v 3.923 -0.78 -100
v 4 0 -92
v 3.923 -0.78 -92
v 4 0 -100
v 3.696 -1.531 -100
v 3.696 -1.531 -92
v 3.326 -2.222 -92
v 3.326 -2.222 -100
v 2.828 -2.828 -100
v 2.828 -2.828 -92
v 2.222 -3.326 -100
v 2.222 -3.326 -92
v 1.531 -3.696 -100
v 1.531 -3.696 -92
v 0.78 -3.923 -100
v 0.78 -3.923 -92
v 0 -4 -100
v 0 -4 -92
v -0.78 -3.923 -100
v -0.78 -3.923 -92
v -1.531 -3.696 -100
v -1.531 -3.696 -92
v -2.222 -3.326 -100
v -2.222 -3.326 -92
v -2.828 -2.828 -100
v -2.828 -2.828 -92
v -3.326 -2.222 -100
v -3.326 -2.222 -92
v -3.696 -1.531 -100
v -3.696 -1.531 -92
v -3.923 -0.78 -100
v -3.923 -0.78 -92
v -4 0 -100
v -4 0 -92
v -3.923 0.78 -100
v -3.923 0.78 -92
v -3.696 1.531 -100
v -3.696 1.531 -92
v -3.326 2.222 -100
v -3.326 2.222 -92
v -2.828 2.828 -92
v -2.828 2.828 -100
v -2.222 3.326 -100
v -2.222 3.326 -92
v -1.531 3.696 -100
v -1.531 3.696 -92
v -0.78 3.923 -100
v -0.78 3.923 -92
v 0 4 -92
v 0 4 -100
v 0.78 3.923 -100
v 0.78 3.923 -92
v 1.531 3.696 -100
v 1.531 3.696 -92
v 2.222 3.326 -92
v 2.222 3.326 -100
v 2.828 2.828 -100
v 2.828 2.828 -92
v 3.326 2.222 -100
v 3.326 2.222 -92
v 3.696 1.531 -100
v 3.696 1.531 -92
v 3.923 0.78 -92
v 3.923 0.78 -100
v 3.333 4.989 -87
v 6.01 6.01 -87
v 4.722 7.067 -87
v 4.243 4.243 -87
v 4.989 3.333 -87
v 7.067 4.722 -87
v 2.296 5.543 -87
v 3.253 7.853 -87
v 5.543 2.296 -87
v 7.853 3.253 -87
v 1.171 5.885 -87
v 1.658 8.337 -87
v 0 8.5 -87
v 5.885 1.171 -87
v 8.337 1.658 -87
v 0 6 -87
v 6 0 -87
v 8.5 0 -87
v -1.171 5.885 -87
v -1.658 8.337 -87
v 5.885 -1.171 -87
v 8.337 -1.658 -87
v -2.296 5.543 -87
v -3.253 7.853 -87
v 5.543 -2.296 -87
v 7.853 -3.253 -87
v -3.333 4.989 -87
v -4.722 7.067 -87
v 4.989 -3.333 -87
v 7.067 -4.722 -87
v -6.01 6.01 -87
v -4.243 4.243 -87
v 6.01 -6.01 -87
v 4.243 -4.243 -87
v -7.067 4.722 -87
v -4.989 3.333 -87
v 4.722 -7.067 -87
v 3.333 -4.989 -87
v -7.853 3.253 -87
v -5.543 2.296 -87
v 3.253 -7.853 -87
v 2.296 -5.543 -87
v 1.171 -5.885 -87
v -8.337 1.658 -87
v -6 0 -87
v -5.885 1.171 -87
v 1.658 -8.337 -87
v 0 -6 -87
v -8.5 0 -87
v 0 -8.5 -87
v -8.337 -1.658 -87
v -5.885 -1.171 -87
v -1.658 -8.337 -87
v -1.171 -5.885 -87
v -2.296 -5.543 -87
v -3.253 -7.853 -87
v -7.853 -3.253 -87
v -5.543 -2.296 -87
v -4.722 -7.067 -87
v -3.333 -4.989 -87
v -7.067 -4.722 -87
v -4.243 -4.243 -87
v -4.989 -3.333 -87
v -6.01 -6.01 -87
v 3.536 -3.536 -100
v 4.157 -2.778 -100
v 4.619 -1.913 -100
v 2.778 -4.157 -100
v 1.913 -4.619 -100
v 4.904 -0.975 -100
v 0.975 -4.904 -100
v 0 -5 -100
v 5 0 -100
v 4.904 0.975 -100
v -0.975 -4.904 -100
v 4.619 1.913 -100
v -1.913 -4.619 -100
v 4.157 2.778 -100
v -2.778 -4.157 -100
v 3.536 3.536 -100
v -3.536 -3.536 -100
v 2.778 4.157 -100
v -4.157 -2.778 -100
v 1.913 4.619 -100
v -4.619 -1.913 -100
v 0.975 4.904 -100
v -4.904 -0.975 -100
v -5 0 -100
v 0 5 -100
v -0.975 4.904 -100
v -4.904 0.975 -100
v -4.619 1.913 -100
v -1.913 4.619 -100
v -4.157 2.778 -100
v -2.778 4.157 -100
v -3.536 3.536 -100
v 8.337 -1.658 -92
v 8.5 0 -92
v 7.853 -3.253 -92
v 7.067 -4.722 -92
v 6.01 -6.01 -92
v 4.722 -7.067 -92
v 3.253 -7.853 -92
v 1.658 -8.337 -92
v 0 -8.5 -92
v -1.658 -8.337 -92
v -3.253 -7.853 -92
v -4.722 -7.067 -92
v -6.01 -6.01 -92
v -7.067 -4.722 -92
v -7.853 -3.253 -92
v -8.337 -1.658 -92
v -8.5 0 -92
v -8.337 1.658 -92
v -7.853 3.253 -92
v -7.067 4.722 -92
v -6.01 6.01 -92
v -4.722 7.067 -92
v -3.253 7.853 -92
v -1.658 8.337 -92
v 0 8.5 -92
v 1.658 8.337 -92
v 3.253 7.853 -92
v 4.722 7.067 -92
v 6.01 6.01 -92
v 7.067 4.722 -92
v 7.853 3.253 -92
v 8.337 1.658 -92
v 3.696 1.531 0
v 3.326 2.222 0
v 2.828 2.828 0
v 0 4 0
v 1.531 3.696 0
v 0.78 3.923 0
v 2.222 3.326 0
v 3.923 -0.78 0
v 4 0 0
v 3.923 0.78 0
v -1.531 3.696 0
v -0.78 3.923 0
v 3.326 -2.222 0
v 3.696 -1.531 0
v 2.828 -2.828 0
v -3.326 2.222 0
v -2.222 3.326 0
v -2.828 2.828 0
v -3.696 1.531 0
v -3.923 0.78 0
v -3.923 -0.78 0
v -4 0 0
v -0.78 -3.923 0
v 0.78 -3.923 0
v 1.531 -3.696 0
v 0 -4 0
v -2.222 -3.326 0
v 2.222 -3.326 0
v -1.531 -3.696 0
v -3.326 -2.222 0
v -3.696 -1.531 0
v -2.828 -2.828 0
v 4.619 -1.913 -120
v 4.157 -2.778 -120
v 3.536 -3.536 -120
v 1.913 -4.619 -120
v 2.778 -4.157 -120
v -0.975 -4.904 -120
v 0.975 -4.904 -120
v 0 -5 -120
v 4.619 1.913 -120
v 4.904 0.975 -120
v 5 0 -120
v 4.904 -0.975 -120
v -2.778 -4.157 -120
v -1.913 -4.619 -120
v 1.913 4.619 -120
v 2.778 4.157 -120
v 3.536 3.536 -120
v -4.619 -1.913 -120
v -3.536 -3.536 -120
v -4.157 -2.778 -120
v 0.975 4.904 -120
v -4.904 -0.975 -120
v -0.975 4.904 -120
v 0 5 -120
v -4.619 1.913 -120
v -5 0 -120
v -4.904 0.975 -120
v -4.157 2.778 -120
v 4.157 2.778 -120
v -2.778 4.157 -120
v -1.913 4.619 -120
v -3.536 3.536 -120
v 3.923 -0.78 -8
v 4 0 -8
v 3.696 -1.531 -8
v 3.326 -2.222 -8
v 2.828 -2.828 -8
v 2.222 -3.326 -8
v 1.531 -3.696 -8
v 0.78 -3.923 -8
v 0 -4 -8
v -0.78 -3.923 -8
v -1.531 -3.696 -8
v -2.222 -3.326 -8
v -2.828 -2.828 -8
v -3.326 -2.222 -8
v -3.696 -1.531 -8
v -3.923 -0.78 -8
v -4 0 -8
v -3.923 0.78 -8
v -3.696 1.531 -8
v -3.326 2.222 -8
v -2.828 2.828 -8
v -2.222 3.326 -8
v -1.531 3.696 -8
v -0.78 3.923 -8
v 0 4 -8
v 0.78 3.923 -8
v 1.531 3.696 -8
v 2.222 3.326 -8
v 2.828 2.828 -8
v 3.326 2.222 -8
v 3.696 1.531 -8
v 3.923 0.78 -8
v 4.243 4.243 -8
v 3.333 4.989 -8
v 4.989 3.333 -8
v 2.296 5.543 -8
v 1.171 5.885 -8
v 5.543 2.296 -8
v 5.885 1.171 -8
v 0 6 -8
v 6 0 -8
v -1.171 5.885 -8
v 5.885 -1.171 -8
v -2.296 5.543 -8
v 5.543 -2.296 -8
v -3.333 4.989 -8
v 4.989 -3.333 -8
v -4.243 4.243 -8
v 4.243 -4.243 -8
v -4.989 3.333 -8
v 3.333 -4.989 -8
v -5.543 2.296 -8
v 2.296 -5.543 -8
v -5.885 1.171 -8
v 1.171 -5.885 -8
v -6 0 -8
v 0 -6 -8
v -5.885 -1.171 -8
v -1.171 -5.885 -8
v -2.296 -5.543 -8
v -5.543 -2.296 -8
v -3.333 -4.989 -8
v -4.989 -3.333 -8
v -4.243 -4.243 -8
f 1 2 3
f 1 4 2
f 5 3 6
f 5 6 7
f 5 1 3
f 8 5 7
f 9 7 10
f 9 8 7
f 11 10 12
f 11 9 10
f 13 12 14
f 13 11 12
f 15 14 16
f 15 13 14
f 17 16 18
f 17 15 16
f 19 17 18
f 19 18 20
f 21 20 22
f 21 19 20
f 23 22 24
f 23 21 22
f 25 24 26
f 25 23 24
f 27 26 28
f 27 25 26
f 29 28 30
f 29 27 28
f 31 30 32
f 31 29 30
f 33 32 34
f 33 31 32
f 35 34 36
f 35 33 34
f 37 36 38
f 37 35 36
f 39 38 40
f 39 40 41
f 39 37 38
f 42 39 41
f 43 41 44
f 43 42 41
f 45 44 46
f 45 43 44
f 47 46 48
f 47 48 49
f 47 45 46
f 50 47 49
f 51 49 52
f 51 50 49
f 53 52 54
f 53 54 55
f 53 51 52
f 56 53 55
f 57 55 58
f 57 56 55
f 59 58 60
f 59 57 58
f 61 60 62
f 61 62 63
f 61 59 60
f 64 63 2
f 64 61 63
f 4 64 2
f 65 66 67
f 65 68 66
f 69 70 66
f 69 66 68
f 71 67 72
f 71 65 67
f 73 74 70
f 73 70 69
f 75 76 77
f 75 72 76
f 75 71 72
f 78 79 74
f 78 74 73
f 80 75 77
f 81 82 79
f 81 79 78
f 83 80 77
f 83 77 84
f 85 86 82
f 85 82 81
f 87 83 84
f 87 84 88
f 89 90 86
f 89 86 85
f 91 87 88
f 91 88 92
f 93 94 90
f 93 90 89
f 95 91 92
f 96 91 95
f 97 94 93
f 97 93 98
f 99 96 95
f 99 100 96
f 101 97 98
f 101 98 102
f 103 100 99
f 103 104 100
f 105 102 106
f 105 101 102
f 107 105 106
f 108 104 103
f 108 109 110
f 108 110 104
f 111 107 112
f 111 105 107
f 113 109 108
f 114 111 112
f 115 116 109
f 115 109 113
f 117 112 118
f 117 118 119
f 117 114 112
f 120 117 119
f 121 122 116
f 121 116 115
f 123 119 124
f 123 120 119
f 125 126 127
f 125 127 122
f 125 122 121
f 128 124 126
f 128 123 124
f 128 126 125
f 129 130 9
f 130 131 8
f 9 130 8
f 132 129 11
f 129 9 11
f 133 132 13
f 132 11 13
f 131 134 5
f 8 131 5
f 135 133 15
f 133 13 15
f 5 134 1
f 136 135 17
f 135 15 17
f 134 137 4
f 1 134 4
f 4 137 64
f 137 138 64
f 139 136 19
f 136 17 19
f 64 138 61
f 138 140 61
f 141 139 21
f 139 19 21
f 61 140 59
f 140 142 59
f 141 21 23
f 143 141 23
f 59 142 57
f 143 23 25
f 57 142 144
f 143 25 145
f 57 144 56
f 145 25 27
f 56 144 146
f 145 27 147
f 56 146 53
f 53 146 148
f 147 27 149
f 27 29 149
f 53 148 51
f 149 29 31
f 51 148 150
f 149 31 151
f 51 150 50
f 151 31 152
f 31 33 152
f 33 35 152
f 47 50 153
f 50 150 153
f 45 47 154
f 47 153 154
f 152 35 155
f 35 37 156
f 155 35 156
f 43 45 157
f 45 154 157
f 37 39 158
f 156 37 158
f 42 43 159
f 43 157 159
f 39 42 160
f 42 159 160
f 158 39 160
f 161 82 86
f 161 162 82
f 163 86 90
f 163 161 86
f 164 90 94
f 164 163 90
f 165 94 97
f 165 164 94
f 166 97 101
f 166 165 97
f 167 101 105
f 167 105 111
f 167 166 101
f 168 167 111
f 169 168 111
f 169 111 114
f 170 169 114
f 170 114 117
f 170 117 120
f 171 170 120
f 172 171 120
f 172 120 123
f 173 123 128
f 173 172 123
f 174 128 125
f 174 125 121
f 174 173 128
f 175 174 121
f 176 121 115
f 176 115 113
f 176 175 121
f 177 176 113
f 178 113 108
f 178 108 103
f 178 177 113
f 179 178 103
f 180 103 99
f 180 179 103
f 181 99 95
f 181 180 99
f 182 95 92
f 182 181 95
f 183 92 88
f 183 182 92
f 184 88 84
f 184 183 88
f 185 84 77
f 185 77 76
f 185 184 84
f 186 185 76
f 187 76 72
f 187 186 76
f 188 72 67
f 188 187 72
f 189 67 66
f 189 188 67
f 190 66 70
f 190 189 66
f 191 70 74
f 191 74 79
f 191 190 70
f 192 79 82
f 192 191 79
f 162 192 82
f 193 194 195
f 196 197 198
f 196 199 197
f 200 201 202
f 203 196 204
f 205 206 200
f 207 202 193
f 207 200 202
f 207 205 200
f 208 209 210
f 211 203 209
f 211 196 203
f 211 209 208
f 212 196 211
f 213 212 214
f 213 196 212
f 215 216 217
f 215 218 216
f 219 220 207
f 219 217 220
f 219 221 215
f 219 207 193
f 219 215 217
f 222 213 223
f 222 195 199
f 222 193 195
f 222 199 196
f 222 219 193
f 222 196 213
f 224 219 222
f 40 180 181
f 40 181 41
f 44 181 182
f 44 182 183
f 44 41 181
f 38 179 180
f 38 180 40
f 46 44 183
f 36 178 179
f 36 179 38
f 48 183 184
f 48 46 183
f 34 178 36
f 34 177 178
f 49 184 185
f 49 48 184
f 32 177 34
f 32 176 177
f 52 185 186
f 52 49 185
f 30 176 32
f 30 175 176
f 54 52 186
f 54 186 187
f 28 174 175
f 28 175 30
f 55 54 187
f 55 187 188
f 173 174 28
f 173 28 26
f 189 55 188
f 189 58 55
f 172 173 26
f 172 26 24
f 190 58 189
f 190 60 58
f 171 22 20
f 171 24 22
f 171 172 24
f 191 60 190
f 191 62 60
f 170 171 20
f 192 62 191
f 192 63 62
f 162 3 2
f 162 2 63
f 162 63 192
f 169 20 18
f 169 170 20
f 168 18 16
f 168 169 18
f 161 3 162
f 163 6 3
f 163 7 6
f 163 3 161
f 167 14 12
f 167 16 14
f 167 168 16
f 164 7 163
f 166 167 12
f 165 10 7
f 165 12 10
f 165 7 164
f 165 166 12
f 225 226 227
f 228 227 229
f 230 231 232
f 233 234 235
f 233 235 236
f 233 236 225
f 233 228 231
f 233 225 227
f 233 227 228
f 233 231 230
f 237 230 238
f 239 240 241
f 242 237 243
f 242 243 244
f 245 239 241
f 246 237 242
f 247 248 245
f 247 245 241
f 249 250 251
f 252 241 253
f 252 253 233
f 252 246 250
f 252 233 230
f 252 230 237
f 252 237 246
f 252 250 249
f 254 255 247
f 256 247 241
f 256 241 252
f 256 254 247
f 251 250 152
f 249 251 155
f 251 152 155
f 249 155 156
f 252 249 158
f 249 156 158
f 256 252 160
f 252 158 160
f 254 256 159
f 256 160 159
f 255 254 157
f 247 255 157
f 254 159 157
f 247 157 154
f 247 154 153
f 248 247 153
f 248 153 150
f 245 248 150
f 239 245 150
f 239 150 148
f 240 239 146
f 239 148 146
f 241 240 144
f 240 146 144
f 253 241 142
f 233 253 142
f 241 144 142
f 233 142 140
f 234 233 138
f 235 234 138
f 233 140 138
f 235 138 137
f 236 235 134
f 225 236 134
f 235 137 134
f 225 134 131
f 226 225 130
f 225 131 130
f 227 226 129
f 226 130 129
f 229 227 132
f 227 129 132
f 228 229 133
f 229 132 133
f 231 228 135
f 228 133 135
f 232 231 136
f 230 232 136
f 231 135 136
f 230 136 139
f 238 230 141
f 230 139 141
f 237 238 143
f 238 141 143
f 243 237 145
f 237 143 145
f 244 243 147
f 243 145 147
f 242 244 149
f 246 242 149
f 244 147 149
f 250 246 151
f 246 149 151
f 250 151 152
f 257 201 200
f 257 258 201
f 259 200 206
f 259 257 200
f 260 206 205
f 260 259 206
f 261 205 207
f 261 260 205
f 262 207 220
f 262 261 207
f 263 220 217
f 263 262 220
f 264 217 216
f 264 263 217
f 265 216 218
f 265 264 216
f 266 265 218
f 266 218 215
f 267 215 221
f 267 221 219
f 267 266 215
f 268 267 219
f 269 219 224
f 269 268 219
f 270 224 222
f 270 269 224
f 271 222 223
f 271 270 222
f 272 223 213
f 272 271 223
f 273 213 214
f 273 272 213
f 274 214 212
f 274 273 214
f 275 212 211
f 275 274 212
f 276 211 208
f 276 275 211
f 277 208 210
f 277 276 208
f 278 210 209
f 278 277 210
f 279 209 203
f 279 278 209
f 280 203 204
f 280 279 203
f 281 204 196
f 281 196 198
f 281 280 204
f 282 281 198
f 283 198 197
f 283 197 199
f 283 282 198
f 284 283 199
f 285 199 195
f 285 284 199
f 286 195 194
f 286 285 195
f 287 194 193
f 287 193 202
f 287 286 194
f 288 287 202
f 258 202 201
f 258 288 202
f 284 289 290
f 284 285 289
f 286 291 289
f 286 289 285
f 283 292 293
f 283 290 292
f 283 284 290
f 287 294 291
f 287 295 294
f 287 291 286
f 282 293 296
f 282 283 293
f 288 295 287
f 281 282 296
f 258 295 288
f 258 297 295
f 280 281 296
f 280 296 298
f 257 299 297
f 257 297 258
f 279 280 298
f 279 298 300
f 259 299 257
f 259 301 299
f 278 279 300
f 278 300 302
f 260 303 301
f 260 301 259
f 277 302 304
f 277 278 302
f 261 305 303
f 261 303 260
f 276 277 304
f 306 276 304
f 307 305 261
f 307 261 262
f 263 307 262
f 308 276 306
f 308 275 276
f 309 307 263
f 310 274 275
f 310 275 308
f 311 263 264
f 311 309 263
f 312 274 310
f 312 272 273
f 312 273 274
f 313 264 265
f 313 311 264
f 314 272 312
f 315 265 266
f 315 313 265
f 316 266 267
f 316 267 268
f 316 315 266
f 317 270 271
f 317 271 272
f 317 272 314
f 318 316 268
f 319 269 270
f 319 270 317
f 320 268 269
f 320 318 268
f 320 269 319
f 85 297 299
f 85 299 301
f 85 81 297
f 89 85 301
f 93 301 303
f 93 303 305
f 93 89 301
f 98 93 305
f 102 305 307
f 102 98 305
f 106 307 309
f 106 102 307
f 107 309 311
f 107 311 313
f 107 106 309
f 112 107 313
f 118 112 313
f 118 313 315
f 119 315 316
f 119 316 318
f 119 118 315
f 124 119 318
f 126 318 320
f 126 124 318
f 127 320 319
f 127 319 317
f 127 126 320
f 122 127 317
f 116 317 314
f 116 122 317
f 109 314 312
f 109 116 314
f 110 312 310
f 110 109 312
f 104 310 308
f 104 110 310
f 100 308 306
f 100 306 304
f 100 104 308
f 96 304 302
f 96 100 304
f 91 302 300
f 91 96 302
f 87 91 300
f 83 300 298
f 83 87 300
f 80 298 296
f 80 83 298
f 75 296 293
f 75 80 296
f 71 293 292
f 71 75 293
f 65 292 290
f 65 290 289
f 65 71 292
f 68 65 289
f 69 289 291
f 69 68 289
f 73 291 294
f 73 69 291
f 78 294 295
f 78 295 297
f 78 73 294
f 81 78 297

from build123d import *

# Parameters (mm, degrees)
SKETCH3_R           = 5
BOSS_EXTRUDE1_DEPTH = 20


with BuildPart() as part:
    # Sketch2 → Revolve1 (revolve)
    with BuildSketch(Plane(origin=(0, 0, 0), x_dir=(0, 0, -1), z_dir=(1, 0, 0)), mode=Mode.PRIVATE) as revolve1_sk:
        Polygon((0, 0), (0, 4), (8, 4), (8, 6), (87, 6), (87, 8.5), (92, 8.5), (92, 4), (100, 4), (100, 0), align=None)
    revolve(revolve1_sk.sketch.rotate(Axis((0, 0, 0), (0, 0, -1)), 90), axis=Axis((0, 0, 0), (0, 0, -1)))

    # Sketch3 → Boss-Extrude1 (add)
    with BuildSketch(Plane(origin=(0, 0, -100), x_dir=(-1, 0, 0), z_dir=(0, 0, -1))):
        Circle(SKETCH3_R)
    extrude(amount=BOSS_EXTRUDE1_DEPTH)


solid = part.part
